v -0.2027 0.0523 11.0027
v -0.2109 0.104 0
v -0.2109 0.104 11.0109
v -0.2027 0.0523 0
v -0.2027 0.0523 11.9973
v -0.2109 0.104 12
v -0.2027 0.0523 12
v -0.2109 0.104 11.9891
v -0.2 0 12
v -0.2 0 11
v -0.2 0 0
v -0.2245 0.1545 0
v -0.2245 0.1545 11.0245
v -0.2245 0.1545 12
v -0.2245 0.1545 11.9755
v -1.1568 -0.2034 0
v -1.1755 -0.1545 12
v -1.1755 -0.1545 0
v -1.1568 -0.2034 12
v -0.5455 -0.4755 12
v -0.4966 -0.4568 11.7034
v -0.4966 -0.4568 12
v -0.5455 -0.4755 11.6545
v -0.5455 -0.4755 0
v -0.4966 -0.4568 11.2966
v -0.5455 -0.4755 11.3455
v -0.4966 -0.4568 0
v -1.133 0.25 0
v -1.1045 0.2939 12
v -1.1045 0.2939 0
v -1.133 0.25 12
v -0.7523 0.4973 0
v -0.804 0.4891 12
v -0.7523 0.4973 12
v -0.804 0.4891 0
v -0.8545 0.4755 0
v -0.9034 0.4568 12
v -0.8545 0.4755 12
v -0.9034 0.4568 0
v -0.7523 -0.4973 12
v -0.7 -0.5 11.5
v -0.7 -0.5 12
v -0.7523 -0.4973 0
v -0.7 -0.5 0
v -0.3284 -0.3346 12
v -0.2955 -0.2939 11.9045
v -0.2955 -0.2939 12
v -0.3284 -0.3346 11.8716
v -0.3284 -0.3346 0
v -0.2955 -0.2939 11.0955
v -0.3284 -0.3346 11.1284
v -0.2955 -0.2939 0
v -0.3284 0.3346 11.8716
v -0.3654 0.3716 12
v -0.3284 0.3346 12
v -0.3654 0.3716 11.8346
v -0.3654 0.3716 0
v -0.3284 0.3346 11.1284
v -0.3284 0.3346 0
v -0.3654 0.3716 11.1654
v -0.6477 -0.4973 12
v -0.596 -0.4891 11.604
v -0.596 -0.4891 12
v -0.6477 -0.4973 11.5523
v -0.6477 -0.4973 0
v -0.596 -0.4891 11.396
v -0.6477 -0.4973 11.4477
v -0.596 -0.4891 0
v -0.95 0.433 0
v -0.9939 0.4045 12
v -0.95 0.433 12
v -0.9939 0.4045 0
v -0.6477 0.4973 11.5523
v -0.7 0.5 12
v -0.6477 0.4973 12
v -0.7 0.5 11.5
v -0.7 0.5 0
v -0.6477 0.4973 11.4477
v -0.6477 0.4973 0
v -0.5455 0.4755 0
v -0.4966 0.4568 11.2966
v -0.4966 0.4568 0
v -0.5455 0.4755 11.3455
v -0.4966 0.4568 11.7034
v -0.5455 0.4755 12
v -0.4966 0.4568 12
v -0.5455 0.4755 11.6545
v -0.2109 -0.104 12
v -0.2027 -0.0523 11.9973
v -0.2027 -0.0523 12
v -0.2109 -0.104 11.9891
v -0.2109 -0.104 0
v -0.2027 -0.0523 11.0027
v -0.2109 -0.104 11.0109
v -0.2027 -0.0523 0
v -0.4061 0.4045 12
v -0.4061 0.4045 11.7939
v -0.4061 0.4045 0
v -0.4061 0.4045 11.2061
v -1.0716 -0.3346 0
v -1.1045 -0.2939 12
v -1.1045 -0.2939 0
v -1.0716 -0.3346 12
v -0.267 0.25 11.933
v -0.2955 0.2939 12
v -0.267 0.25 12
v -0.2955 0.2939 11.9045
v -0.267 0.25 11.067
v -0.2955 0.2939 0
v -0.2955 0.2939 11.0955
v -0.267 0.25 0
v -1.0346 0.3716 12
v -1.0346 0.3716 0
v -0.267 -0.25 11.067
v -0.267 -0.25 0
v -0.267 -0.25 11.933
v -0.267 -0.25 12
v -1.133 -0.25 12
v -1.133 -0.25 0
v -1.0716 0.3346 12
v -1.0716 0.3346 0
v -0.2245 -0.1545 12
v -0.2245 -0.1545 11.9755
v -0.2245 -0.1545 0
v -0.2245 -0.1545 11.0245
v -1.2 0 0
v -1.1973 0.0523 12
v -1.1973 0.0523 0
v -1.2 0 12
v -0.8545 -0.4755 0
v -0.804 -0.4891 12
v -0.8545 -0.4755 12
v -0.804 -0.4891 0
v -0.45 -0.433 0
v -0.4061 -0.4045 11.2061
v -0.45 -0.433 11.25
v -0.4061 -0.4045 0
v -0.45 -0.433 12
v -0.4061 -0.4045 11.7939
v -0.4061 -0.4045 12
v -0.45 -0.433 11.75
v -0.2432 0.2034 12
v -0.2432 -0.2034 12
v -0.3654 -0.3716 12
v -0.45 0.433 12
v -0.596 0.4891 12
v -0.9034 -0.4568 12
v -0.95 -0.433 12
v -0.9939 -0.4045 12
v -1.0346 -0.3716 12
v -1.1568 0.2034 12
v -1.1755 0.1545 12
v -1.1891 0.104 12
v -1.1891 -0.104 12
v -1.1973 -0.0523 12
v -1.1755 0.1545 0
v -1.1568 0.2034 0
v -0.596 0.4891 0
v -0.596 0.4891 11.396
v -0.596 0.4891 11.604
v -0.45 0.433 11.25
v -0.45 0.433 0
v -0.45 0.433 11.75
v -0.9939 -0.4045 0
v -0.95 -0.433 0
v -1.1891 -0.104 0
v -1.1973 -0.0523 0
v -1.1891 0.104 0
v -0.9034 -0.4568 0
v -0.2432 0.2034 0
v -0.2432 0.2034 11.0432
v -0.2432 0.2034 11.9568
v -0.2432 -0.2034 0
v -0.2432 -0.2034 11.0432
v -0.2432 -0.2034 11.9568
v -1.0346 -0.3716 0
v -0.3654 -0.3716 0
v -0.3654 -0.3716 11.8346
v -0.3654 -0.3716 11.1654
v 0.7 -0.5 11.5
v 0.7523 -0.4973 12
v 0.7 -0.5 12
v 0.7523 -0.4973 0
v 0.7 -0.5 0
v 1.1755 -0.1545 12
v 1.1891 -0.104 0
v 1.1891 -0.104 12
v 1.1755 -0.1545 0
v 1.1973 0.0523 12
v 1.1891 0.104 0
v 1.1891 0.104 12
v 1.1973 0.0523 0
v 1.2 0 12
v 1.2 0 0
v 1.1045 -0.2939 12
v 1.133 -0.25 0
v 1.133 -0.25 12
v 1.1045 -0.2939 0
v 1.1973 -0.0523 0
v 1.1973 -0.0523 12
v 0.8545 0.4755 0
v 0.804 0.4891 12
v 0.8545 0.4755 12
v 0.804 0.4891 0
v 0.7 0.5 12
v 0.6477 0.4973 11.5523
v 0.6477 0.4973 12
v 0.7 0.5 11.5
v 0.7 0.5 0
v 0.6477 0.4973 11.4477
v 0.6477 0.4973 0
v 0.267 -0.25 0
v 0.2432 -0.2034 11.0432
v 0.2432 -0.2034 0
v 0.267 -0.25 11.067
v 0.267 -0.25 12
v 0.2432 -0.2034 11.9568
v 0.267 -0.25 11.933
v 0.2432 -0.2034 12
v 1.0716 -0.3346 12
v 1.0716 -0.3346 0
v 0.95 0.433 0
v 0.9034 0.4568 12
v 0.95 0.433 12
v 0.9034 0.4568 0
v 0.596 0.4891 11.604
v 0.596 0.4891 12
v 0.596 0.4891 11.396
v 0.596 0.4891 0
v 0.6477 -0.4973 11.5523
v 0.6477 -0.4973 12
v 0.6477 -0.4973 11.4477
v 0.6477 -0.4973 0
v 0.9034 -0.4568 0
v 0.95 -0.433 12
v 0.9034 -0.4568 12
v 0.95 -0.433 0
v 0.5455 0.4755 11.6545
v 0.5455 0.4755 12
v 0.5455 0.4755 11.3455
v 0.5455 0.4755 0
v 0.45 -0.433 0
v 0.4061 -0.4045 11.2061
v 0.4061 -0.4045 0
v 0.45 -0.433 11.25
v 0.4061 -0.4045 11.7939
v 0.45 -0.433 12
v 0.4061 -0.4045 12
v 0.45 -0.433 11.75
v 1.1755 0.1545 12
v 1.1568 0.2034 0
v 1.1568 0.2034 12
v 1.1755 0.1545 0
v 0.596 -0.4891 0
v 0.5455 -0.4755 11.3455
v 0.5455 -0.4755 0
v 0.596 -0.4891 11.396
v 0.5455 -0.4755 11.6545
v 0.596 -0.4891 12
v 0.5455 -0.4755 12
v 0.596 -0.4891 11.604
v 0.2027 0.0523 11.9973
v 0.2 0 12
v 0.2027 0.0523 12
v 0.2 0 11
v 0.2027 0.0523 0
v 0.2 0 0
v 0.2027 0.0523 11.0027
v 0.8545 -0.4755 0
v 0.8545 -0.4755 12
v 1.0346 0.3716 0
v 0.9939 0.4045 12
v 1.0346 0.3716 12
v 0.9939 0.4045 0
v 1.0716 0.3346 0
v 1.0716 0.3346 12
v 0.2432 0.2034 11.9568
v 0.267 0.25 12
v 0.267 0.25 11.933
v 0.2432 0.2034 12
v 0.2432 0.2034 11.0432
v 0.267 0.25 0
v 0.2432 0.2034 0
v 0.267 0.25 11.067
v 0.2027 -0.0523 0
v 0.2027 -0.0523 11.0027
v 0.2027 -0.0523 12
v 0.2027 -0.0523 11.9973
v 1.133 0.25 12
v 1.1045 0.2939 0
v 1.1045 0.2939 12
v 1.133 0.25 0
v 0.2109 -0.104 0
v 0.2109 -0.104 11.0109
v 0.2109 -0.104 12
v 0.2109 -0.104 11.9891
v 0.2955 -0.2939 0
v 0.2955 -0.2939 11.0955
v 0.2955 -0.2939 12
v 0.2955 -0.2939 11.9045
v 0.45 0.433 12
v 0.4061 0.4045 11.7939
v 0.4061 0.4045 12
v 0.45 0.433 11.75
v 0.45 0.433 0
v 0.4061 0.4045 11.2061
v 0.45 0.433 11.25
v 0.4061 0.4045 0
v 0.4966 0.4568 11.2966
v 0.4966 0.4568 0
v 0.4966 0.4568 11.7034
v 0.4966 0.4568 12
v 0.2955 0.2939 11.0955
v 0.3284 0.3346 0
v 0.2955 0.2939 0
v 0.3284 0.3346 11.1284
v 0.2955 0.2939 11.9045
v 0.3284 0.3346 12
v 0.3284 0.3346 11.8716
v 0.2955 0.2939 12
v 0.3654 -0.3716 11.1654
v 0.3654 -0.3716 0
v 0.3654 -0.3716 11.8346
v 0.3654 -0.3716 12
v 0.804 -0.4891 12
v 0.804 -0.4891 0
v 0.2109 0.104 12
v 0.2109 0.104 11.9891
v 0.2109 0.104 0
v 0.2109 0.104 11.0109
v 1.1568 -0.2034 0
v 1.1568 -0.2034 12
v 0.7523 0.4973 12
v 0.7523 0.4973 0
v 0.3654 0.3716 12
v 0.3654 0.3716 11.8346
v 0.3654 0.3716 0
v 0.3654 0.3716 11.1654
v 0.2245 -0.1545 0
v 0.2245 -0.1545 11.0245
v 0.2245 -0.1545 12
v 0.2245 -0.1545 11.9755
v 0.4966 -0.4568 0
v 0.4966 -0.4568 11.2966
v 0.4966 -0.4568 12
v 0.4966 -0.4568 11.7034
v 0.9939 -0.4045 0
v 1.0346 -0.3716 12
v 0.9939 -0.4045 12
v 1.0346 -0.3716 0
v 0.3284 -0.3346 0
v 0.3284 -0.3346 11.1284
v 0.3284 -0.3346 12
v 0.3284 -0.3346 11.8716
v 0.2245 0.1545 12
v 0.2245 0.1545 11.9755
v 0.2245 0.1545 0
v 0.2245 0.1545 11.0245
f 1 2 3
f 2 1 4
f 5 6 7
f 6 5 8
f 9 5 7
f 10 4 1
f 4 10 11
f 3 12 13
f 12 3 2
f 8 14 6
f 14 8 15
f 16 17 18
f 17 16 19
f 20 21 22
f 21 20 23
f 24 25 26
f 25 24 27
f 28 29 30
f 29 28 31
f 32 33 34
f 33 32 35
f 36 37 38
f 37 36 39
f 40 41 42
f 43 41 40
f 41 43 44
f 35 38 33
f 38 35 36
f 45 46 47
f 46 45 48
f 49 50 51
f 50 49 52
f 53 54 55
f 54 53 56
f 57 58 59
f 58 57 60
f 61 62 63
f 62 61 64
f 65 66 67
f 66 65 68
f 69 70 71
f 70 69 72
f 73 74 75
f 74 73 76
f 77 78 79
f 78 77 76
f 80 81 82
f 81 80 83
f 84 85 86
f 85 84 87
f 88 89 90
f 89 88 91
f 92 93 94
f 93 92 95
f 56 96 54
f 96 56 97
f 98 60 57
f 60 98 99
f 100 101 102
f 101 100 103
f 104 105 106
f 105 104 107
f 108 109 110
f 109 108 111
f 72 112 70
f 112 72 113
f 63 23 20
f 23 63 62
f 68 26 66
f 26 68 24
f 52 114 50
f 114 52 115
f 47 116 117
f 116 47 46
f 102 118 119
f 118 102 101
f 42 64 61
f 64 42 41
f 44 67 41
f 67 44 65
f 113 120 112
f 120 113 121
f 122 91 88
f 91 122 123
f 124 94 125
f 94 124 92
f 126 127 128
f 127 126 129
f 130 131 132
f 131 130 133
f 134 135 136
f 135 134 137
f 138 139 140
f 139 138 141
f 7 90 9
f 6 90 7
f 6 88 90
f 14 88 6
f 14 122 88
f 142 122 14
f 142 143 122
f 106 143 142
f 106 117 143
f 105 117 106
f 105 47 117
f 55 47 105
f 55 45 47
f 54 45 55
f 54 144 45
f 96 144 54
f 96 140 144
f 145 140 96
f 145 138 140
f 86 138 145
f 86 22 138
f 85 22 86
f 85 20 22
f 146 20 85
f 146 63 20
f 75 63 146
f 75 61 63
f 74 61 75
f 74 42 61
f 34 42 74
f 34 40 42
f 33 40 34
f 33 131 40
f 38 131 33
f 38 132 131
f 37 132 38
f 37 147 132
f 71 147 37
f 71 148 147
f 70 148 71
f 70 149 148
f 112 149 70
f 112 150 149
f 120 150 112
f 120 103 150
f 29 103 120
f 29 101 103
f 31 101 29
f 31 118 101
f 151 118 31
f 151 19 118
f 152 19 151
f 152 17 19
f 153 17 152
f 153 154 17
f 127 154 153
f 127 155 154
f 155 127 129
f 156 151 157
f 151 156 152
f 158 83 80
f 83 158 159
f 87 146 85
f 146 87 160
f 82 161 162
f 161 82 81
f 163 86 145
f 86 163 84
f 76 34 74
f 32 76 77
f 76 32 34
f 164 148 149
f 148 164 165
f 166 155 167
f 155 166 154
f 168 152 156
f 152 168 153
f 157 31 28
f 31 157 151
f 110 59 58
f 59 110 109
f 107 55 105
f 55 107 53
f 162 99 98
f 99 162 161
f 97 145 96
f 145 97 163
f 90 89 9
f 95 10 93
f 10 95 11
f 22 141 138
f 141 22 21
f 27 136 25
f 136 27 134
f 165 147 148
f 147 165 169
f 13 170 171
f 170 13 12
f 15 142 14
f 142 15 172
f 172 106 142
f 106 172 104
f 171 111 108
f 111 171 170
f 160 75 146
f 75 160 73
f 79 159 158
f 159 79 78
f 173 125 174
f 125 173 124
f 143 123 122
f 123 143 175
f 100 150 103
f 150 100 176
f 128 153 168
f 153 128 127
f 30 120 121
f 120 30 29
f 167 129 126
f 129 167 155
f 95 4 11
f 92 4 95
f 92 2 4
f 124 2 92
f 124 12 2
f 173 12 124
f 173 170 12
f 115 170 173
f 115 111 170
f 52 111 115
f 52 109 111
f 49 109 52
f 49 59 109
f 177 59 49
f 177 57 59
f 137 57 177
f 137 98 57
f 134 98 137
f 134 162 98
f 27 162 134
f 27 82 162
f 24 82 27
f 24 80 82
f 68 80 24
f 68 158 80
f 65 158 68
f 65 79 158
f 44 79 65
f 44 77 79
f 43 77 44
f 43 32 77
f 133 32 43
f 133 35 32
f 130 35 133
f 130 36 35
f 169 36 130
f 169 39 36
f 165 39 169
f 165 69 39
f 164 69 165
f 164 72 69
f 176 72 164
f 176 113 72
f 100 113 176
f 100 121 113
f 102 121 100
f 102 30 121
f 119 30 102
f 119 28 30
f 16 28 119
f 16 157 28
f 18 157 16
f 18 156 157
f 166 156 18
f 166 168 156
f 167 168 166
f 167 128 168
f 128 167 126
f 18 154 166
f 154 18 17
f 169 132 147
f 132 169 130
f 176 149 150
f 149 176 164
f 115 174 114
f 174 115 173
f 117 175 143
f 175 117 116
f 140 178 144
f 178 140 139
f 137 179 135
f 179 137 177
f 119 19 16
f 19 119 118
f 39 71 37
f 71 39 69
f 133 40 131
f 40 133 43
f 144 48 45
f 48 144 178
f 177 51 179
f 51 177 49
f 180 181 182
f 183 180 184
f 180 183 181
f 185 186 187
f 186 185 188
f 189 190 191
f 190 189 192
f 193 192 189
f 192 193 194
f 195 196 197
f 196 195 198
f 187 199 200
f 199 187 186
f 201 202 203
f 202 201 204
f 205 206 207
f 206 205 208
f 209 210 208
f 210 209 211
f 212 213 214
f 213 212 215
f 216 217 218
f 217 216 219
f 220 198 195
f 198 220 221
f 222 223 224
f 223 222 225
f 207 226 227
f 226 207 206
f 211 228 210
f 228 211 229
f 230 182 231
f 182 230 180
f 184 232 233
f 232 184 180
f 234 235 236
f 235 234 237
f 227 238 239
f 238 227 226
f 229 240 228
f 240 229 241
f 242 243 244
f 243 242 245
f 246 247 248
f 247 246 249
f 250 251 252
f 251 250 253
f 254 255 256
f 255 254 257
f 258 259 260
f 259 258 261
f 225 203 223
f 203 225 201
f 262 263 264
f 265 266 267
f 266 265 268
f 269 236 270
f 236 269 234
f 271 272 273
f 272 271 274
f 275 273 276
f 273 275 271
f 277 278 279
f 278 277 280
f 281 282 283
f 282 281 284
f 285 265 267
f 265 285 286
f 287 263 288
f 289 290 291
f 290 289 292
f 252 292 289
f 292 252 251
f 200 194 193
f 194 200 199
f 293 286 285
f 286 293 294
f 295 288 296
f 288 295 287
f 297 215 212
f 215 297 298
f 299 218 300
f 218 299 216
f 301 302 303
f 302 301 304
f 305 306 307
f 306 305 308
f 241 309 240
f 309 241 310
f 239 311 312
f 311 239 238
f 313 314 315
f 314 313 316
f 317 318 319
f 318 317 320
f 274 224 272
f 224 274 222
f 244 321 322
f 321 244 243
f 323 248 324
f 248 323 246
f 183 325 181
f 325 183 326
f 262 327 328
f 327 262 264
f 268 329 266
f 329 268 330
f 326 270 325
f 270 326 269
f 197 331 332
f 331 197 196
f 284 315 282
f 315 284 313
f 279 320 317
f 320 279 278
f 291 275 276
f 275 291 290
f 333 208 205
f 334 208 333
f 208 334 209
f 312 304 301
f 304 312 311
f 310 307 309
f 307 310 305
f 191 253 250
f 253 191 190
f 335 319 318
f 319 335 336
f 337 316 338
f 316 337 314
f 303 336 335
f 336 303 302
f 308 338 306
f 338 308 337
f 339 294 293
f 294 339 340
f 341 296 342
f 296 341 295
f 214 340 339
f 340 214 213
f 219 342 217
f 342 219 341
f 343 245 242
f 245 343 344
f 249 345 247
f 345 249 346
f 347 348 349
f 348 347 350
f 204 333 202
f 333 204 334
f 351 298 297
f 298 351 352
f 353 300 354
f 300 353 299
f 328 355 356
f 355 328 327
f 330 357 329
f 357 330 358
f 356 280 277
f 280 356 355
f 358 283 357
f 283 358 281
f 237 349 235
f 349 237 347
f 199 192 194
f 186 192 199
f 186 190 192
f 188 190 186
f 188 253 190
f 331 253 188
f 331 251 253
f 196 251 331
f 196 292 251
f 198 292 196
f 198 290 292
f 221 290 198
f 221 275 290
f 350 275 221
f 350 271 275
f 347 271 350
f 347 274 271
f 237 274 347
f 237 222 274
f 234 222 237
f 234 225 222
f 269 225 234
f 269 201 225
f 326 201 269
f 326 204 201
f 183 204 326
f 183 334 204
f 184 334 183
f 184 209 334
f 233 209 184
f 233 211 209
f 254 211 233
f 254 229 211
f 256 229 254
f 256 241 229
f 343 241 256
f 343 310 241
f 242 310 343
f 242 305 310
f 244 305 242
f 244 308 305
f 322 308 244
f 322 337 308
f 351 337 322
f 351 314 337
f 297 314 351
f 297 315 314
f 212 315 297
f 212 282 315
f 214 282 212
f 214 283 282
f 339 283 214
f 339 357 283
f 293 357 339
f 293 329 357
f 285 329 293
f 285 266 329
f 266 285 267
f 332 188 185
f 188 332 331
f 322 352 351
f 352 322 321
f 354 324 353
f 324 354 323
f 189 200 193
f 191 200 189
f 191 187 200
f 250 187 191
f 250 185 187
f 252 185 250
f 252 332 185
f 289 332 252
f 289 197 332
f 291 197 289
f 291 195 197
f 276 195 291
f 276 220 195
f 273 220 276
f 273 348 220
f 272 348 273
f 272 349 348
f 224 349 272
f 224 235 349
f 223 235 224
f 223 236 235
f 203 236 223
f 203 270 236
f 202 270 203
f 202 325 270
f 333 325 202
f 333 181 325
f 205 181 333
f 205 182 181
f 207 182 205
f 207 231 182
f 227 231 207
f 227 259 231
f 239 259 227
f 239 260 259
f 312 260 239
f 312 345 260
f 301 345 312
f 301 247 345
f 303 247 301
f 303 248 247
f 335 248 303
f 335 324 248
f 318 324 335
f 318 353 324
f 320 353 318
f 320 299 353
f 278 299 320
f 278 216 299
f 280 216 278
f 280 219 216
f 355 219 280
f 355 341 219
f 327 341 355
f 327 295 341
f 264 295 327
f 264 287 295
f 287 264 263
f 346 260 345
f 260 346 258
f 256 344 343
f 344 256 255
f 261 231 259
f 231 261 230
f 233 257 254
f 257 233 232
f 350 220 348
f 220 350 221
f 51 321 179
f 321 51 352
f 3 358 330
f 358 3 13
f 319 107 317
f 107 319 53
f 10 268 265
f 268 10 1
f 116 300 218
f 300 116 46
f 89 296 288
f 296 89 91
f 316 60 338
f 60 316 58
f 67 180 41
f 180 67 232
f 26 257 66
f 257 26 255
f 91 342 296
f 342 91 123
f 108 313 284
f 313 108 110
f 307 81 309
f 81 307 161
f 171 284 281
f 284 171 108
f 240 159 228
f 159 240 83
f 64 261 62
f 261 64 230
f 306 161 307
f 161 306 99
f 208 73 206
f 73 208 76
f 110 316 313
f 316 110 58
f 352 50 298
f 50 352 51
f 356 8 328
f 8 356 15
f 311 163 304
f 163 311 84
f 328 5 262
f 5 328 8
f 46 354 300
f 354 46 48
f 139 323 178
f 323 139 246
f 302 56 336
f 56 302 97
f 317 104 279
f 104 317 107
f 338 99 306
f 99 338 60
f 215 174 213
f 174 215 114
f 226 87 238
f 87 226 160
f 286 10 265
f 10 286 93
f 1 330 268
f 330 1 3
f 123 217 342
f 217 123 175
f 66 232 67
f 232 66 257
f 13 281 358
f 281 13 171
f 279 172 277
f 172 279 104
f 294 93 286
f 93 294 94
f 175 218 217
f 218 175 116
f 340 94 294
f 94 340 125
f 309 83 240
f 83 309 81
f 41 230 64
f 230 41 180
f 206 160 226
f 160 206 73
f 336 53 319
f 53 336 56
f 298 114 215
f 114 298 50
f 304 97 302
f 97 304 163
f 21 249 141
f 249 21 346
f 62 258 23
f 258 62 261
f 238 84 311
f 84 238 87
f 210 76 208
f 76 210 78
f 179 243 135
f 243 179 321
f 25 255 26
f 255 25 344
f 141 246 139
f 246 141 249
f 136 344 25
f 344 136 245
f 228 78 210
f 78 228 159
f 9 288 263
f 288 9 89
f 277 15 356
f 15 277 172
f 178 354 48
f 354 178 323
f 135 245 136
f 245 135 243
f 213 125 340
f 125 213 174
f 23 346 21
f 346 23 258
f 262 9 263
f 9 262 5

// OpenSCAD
// Two-prong cotter pin.
$fn = 60;
eps = 0.02;
wire_d = 1;
length = 12;
prong_gap = wire_d*1.4;
union() {
    translate([-prong_gap/2,0,0]) cylinder(d=wire_d,h=length);
    translate([prong_gap/2,0,0]) cylinder(d=wire_d,h=length);
    translate([-prong_gap/2,0,length-wire_d/2]) rotate([0,90,0]) cylinder(d=wire_d,h=prong_gap);
}
